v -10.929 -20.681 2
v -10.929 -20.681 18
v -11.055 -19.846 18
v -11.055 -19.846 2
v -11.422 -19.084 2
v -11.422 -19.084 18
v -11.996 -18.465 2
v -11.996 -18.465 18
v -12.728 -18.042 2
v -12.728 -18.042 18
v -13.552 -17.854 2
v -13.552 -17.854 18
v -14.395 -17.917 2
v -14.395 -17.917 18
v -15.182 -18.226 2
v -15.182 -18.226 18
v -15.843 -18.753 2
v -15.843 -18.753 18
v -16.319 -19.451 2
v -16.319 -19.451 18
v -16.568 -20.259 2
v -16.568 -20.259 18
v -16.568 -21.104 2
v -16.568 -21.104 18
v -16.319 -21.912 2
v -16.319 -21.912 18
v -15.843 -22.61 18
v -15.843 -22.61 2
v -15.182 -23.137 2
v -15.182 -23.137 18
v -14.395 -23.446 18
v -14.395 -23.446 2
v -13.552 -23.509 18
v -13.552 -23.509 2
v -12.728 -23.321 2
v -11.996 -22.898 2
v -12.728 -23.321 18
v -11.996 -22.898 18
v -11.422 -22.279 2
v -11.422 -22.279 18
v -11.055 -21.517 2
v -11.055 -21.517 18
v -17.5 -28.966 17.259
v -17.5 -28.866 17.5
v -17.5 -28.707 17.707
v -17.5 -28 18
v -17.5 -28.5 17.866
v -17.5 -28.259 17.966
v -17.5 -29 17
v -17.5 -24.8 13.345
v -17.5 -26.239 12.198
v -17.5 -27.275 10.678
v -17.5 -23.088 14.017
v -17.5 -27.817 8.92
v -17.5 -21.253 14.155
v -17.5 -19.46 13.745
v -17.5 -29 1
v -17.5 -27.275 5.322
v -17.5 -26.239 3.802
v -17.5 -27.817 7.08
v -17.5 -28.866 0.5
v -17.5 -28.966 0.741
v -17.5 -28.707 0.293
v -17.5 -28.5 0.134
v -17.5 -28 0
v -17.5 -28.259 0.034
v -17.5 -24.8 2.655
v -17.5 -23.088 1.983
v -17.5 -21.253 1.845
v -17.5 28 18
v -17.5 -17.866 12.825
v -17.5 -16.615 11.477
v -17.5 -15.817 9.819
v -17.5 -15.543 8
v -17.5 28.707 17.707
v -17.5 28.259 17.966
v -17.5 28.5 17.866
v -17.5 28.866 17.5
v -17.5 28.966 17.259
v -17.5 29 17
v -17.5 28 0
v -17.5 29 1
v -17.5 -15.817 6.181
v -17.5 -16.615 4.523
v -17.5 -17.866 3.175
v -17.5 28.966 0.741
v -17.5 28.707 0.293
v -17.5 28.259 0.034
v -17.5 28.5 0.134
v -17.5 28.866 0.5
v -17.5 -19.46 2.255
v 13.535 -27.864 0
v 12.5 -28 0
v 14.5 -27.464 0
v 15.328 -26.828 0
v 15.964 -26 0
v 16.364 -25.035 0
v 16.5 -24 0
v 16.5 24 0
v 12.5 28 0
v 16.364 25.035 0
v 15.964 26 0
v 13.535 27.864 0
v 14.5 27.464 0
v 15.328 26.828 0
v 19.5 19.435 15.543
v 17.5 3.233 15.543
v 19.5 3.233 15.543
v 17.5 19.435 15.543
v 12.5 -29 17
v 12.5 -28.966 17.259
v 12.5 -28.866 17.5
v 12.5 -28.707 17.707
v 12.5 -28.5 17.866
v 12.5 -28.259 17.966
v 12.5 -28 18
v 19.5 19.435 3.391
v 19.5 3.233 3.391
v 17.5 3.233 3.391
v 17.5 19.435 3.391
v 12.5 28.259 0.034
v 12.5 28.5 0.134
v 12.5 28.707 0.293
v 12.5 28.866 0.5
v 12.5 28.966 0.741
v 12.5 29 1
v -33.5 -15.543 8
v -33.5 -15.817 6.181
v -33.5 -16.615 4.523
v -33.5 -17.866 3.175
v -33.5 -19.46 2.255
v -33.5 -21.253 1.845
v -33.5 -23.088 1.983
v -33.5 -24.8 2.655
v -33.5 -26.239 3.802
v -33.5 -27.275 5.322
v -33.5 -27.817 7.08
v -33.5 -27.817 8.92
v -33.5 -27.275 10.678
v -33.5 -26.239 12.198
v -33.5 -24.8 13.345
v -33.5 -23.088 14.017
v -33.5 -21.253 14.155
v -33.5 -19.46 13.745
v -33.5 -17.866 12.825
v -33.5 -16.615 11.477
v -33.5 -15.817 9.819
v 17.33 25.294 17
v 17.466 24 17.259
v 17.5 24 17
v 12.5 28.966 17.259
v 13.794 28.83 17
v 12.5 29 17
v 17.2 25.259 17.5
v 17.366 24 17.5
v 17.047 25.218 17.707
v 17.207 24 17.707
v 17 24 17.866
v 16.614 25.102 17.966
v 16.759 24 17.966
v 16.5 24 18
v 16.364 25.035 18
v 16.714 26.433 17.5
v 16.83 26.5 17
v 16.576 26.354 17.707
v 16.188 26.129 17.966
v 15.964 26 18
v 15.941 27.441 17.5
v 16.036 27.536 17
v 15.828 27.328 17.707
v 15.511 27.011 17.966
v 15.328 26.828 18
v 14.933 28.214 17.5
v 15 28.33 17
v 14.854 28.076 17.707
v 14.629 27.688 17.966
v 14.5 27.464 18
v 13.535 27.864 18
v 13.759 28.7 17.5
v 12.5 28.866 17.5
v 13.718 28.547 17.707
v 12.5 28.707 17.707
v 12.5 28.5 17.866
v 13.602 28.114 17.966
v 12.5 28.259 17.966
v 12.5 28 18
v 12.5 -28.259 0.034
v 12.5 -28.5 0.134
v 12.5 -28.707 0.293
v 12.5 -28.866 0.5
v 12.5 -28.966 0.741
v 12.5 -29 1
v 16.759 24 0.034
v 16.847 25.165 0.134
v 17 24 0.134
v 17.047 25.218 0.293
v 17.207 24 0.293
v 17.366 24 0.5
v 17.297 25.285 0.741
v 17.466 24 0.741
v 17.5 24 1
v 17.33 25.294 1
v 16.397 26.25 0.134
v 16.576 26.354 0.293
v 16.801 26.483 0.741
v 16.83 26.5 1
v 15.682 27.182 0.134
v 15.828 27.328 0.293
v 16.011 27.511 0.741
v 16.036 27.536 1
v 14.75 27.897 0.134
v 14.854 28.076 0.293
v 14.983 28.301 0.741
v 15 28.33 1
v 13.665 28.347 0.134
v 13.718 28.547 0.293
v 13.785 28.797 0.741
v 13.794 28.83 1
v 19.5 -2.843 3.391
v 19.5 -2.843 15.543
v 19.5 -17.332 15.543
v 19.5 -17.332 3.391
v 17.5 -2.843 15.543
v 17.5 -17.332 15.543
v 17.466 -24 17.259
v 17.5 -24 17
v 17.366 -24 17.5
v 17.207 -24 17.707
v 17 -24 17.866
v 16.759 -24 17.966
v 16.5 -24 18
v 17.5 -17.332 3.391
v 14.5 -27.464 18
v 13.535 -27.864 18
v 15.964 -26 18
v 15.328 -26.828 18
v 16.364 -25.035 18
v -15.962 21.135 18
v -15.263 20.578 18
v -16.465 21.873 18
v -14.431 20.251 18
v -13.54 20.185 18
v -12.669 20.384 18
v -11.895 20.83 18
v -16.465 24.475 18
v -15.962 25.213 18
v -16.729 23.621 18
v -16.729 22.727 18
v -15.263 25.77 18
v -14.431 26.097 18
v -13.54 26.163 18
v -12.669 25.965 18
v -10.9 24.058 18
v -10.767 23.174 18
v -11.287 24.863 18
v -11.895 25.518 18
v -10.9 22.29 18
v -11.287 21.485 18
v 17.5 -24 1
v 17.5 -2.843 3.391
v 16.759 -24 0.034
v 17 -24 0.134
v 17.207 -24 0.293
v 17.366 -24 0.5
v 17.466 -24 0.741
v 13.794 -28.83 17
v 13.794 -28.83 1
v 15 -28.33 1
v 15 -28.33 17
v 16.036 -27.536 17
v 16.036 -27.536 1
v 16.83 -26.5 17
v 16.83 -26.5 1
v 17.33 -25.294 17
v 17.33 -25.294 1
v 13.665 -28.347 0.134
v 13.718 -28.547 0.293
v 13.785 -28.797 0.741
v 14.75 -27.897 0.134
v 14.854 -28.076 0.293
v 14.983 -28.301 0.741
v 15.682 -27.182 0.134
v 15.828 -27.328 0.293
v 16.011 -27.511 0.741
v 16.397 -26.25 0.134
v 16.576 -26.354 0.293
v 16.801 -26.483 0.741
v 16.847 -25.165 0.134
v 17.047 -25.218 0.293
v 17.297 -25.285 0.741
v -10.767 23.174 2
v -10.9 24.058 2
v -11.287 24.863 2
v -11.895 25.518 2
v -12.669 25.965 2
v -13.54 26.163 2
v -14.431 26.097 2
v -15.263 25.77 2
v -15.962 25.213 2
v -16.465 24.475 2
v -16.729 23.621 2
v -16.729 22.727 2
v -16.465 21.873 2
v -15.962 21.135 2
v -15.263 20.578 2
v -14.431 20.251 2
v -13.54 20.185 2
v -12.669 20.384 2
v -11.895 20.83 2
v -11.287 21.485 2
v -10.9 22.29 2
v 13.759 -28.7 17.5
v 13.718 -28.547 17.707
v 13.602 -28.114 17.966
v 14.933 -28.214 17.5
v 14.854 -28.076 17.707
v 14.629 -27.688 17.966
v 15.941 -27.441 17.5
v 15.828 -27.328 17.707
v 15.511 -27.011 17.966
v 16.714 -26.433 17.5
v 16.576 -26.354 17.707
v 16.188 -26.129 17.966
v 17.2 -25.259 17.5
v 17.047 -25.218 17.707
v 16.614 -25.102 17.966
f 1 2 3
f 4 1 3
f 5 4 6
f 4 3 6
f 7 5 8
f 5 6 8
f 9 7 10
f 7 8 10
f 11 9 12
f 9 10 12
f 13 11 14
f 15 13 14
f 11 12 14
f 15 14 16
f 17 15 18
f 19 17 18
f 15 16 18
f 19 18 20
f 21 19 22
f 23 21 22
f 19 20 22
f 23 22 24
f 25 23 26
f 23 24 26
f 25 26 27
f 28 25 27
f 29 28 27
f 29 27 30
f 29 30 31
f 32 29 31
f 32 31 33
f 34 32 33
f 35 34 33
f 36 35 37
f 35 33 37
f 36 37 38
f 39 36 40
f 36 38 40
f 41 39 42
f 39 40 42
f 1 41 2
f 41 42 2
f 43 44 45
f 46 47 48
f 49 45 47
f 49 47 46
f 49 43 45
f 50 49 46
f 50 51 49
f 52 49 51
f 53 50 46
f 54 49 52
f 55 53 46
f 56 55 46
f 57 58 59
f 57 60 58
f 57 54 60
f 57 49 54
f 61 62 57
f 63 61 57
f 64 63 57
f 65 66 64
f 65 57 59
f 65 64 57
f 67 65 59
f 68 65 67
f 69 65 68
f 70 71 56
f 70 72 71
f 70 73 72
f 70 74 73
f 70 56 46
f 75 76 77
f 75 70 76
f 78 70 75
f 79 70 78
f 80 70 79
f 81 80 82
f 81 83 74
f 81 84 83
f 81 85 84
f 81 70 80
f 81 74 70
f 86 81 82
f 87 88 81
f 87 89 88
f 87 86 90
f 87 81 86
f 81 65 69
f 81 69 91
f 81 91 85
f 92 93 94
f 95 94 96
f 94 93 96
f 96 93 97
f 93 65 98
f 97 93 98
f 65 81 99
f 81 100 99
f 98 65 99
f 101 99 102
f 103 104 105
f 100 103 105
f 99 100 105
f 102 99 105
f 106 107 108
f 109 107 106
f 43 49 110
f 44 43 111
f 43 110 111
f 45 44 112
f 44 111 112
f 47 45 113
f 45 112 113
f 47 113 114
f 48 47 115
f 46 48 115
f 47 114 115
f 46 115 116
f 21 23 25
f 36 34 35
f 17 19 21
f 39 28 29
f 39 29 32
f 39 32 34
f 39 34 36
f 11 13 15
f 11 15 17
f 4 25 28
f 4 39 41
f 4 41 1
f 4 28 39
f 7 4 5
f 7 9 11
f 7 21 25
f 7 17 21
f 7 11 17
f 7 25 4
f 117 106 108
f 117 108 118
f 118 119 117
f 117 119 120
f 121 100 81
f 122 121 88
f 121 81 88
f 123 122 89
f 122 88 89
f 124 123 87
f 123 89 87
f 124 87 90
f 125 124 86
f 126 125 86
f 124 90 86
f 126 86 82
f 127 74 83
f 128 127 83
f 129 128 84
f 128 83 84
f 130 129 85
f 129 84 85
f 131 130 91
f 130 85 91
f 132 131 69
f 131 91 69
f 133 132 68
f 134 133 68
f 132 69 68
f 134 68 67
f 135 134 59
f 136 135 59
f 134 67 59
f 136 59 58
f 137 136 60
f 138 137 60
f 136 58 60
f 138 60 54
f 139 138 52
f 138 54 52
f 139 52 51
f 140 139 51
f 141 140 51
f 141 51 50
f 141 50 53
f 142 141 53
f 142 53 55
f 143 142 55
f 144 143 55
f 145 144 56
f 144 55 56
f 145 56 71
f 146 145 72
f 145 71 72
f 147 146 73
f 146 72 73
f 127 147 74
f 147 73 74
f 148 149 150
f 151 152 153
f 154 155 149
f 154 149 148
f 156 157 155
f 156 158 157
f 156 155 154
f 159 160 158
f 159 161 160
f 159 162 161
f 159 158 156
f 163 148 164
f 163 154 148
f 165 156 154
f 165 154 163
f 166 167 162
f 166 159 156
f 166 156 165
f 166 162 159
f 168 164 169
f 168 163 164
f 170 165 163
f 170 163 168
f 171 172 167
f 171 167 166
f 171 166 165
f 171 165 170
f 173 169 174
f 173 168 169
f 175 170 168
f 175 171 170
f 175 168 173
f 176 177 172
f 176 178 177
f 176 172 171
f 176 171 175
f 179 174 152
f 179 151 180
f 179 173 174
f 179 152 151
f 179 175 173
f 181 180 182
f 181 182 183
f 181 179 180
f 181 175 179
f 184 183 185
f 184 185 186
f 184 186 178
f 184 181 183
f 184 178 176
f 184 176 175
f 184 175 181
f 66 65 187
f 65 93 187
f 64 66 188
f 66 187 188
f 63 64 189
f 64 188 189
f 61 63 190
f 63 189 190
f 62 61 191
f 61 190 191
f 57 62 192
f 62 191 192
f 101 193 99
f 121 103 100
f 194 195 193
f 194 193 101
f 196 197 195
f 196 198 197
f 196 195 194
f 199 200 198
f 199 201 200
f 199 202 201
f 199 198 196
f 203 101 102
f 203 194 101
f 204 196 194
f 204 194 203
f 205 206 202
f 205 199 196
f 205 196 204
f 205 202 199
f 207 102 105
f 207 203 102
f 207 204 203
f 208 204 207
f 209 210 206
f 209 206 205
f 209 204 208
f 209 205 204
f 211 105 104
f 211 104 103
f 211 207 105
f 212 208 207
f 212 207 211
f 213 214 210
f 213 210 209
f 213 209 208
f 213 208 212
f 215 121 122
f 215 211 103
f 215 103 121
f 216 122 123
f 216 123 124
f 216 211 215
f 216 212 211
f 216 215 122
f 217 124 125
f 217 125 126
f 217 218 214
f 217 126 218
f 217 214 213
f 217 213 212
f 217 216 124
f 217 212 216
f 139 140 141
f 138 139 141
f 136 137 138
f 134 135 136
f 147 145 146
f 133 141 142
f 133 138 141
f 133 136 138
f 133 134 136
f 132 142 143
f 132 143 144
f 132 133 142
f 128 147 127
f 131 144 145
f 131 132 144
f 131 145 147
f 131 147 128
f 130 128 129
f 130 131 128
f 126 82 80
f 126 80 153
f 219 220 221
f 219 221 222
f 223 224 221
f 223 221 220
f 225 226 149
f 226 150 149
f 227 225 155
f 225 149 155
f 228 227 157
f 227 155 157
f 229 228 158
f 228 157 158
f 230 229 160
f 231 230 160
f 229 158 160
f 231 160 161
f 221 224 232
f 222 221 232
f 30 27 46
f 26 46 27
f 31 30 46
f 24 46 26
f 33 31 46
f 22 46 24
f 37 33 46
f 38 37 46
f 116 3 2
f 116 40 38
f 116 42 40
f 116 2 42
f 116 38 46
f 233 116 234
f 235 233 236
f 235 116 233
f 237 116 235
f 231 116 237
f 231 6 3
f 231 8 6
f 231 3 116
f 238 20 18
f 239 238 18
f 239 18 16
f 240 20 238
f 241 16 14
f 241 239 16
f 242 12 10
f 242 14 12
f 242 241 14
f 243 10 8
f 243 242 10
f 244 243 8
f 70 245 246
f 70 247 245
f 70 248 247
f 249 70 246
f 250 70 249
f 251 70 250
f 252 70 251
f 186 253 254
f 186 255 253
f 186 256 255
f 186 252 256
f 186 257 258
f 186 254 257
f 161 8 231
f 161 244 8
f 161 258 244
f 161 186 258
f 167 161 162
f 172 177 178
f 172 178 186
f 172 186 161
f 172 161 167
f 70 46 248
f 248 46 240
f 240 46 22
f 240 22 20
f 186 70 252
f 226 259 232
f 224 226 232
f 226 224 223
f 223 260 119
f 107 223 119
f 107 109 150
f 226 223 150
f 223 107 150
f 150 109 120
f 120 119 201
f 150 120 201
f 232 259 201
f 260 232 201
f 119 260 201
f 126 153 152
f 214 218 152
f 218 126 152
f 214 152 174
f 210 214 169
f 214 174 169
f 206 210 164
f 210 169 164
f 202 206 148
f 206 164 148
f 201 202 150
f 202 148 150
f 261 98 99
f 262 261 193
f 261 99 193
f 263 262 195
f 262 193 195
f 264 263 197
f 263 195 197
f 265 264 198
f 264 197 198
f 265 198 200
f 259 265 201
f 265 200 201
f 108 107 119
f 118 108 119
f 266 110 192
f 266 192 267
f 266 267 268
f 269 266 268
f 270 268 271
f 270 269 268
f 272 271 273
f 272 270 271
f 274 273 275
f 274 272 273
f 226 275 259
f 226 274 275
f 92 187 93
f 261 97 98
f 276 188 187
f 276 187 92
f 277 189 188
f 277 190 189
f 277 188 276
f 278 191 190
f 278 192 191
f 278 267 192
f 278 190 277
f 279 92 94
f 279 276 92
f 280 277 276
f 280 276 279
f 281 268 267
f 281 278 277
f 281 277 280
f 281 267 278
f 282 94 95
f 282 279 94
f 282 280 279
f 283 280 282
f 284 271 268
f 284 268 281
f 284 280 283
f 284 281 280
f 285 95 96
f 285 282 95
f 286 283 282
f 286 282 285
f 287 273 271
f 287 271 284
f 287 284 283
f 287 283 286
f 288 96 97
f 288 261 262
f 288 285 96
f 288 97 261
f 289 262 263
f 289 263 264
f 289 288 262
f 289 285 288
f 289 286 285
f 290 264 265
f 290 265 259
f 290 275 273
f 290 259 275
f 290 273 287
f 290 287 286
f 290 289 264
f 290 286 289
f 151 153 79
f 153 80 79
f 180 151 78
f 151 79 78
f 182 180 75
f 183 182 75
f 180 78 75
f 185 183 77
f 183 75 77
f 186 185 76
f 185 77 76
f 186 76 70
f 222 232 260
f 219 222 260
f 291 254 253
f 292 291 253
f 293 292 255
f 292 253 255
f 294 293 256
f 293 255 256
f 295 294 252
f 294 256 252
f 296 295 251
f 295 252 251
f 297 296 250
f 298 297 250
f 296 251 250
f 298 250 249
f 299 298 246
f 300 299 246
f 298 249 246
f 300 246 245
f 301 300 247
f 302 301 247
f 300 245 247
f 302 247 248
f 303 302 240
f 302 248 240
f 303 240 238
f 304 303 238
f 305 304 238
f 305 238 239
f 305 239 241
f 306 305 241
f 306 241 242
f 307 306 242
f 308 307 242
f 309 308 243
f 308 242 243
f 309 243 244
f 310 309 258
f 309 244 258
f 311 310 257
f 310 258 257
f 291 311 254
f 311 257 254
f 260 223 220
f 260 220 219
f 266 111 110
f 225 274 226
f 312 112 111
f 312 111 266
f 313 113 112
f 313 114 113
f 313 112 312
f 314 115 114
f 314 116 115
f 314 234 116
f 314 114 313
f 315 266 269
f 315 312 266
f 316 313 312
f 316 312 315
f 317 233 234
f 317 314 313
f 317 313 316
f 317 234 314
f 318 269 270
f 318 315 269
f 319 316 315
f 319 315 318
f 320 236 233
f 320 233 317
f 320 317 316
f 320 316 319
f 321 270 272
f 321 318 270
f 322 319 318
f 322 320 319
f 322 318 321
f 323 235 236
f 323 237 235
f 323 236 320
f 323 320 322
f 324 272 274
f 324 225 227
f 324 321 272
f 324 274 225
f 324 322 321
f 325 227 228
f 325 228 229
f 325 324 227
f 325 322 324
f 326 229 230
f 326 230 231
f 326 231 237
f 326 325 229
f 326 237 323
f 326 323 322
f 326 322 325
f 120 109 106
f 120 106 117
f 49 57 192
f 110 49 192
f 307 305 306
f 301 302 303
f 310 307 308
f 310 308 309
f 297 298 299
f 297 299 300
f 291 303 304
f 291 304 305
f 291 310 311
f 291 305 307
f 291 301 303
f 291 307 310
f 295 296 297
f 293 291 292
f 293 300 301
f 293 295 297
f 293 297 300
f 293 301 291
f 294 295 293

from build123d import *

# Parameters (mm, degrees)
CROQUIS1_W              = 35
CROQUIS1_H              = 58
SALIENTE_EXTRUIR1_DEPTH = 18
CROQUIS2_R              = 6.171851971
SALIENTE_EXTRUIR2_DEPTH = 16
REDONDEO1_R             = 5
REDONDEO2_R             = 1
CROQUIS3_R              = 2.99773064
CROQUIS3_R_2            = 2.835456682
CORTAR_EXTRUIR1_DEPTH   = 16
CROQUIS4_W              = 12.151773781
CROQUIS4_H              = 16.202365041
CROQUIS4_H_2            = 14.488653354
SALIENTE_EXTRUIR3_DEPTH = 2


with BuildPart() as part:
    # Croquis1 → Saliente-Extruir1 (new body)
    with BuildSketch(Plane.XY):
        Rectangle(CROQUIS1_W, CROQUIS1_H)
    extrude(amount=SALIENTE_EXTRUIR1_DEPTH)

    # Croquis2 → Saliente-Extruir2 (add)
    with BuildSketch(Plane.ZY.offset(17.5)):
        with Locations(Location((8, -21.714410647, 0), (0, 0, 90))):
            Circle(CROQUIS2_R)
    extrude(amount=SALIENTE_EXTRUIR2_DEPTH)

    # Redondeo1
    redondeo1_edges = [part.edges().sort_by_distance(p)[0] for p in [
        (17.5, -29, 9),
        (17.5, 29, 9),
    ]]
    fillet(redondeo1_edges, radius=REDONDEO1_R)

    # Redondeo2
    redondeo2_edges = [part.edges().sort_by_distance(p)[0] for p in [
        (-2.5, -29, 18),
        (17.5, 0, 0),
        (17.5, 0, 18),
        (-2.5, 29, 0),
        (16.035533906, 27.535533906, 0),
        (16.035533906, -27.535533906, 0),
        (-2.5, 29, 18),
        (16.035533906, 27.535533906, 18),
        (16.035533906, -27.535533906, 18),
        (-2.5, -29, 0),
    ]]
    fillet(redondeo2_edges, radius=REDONDEO2_R)

    # Croquis3 → Cortar-Extruir1 (cut)
    with BuildSketch(Plane.XY.offset(18)):
        with Locations((-13.764302947, 23.174055768)):
            Circle(CROQUIS3_R)
        with Locations((-13.764302947, -20.681384223)):
            Circle(CROQUIS3_R_2)
    extrude(amount=-CORTAR_EXTRUIR1_DEPTH, mode=Mode.SUBTRACT)

    # Croquis4 → Saliente-Extruir3 (add)
    with BuildSketch(Plane(origin=(17.5, 0, 0), x_dir=(0, 0, -1), z_dir=(1, 0, 0))):
        with Locations((-9.467375914, 11.333865931)):
            Rectangle(CROQUIS4_W, CROQUIS4_H)
        with Locations((-9.467375914, -10.087530158)):
            Rectangle(CROQUIS4_W, CROQUIS4_H_2)
    extrude(amount=SALIENTE_EXTRUIR3_DEPTH)


solid = part.part
